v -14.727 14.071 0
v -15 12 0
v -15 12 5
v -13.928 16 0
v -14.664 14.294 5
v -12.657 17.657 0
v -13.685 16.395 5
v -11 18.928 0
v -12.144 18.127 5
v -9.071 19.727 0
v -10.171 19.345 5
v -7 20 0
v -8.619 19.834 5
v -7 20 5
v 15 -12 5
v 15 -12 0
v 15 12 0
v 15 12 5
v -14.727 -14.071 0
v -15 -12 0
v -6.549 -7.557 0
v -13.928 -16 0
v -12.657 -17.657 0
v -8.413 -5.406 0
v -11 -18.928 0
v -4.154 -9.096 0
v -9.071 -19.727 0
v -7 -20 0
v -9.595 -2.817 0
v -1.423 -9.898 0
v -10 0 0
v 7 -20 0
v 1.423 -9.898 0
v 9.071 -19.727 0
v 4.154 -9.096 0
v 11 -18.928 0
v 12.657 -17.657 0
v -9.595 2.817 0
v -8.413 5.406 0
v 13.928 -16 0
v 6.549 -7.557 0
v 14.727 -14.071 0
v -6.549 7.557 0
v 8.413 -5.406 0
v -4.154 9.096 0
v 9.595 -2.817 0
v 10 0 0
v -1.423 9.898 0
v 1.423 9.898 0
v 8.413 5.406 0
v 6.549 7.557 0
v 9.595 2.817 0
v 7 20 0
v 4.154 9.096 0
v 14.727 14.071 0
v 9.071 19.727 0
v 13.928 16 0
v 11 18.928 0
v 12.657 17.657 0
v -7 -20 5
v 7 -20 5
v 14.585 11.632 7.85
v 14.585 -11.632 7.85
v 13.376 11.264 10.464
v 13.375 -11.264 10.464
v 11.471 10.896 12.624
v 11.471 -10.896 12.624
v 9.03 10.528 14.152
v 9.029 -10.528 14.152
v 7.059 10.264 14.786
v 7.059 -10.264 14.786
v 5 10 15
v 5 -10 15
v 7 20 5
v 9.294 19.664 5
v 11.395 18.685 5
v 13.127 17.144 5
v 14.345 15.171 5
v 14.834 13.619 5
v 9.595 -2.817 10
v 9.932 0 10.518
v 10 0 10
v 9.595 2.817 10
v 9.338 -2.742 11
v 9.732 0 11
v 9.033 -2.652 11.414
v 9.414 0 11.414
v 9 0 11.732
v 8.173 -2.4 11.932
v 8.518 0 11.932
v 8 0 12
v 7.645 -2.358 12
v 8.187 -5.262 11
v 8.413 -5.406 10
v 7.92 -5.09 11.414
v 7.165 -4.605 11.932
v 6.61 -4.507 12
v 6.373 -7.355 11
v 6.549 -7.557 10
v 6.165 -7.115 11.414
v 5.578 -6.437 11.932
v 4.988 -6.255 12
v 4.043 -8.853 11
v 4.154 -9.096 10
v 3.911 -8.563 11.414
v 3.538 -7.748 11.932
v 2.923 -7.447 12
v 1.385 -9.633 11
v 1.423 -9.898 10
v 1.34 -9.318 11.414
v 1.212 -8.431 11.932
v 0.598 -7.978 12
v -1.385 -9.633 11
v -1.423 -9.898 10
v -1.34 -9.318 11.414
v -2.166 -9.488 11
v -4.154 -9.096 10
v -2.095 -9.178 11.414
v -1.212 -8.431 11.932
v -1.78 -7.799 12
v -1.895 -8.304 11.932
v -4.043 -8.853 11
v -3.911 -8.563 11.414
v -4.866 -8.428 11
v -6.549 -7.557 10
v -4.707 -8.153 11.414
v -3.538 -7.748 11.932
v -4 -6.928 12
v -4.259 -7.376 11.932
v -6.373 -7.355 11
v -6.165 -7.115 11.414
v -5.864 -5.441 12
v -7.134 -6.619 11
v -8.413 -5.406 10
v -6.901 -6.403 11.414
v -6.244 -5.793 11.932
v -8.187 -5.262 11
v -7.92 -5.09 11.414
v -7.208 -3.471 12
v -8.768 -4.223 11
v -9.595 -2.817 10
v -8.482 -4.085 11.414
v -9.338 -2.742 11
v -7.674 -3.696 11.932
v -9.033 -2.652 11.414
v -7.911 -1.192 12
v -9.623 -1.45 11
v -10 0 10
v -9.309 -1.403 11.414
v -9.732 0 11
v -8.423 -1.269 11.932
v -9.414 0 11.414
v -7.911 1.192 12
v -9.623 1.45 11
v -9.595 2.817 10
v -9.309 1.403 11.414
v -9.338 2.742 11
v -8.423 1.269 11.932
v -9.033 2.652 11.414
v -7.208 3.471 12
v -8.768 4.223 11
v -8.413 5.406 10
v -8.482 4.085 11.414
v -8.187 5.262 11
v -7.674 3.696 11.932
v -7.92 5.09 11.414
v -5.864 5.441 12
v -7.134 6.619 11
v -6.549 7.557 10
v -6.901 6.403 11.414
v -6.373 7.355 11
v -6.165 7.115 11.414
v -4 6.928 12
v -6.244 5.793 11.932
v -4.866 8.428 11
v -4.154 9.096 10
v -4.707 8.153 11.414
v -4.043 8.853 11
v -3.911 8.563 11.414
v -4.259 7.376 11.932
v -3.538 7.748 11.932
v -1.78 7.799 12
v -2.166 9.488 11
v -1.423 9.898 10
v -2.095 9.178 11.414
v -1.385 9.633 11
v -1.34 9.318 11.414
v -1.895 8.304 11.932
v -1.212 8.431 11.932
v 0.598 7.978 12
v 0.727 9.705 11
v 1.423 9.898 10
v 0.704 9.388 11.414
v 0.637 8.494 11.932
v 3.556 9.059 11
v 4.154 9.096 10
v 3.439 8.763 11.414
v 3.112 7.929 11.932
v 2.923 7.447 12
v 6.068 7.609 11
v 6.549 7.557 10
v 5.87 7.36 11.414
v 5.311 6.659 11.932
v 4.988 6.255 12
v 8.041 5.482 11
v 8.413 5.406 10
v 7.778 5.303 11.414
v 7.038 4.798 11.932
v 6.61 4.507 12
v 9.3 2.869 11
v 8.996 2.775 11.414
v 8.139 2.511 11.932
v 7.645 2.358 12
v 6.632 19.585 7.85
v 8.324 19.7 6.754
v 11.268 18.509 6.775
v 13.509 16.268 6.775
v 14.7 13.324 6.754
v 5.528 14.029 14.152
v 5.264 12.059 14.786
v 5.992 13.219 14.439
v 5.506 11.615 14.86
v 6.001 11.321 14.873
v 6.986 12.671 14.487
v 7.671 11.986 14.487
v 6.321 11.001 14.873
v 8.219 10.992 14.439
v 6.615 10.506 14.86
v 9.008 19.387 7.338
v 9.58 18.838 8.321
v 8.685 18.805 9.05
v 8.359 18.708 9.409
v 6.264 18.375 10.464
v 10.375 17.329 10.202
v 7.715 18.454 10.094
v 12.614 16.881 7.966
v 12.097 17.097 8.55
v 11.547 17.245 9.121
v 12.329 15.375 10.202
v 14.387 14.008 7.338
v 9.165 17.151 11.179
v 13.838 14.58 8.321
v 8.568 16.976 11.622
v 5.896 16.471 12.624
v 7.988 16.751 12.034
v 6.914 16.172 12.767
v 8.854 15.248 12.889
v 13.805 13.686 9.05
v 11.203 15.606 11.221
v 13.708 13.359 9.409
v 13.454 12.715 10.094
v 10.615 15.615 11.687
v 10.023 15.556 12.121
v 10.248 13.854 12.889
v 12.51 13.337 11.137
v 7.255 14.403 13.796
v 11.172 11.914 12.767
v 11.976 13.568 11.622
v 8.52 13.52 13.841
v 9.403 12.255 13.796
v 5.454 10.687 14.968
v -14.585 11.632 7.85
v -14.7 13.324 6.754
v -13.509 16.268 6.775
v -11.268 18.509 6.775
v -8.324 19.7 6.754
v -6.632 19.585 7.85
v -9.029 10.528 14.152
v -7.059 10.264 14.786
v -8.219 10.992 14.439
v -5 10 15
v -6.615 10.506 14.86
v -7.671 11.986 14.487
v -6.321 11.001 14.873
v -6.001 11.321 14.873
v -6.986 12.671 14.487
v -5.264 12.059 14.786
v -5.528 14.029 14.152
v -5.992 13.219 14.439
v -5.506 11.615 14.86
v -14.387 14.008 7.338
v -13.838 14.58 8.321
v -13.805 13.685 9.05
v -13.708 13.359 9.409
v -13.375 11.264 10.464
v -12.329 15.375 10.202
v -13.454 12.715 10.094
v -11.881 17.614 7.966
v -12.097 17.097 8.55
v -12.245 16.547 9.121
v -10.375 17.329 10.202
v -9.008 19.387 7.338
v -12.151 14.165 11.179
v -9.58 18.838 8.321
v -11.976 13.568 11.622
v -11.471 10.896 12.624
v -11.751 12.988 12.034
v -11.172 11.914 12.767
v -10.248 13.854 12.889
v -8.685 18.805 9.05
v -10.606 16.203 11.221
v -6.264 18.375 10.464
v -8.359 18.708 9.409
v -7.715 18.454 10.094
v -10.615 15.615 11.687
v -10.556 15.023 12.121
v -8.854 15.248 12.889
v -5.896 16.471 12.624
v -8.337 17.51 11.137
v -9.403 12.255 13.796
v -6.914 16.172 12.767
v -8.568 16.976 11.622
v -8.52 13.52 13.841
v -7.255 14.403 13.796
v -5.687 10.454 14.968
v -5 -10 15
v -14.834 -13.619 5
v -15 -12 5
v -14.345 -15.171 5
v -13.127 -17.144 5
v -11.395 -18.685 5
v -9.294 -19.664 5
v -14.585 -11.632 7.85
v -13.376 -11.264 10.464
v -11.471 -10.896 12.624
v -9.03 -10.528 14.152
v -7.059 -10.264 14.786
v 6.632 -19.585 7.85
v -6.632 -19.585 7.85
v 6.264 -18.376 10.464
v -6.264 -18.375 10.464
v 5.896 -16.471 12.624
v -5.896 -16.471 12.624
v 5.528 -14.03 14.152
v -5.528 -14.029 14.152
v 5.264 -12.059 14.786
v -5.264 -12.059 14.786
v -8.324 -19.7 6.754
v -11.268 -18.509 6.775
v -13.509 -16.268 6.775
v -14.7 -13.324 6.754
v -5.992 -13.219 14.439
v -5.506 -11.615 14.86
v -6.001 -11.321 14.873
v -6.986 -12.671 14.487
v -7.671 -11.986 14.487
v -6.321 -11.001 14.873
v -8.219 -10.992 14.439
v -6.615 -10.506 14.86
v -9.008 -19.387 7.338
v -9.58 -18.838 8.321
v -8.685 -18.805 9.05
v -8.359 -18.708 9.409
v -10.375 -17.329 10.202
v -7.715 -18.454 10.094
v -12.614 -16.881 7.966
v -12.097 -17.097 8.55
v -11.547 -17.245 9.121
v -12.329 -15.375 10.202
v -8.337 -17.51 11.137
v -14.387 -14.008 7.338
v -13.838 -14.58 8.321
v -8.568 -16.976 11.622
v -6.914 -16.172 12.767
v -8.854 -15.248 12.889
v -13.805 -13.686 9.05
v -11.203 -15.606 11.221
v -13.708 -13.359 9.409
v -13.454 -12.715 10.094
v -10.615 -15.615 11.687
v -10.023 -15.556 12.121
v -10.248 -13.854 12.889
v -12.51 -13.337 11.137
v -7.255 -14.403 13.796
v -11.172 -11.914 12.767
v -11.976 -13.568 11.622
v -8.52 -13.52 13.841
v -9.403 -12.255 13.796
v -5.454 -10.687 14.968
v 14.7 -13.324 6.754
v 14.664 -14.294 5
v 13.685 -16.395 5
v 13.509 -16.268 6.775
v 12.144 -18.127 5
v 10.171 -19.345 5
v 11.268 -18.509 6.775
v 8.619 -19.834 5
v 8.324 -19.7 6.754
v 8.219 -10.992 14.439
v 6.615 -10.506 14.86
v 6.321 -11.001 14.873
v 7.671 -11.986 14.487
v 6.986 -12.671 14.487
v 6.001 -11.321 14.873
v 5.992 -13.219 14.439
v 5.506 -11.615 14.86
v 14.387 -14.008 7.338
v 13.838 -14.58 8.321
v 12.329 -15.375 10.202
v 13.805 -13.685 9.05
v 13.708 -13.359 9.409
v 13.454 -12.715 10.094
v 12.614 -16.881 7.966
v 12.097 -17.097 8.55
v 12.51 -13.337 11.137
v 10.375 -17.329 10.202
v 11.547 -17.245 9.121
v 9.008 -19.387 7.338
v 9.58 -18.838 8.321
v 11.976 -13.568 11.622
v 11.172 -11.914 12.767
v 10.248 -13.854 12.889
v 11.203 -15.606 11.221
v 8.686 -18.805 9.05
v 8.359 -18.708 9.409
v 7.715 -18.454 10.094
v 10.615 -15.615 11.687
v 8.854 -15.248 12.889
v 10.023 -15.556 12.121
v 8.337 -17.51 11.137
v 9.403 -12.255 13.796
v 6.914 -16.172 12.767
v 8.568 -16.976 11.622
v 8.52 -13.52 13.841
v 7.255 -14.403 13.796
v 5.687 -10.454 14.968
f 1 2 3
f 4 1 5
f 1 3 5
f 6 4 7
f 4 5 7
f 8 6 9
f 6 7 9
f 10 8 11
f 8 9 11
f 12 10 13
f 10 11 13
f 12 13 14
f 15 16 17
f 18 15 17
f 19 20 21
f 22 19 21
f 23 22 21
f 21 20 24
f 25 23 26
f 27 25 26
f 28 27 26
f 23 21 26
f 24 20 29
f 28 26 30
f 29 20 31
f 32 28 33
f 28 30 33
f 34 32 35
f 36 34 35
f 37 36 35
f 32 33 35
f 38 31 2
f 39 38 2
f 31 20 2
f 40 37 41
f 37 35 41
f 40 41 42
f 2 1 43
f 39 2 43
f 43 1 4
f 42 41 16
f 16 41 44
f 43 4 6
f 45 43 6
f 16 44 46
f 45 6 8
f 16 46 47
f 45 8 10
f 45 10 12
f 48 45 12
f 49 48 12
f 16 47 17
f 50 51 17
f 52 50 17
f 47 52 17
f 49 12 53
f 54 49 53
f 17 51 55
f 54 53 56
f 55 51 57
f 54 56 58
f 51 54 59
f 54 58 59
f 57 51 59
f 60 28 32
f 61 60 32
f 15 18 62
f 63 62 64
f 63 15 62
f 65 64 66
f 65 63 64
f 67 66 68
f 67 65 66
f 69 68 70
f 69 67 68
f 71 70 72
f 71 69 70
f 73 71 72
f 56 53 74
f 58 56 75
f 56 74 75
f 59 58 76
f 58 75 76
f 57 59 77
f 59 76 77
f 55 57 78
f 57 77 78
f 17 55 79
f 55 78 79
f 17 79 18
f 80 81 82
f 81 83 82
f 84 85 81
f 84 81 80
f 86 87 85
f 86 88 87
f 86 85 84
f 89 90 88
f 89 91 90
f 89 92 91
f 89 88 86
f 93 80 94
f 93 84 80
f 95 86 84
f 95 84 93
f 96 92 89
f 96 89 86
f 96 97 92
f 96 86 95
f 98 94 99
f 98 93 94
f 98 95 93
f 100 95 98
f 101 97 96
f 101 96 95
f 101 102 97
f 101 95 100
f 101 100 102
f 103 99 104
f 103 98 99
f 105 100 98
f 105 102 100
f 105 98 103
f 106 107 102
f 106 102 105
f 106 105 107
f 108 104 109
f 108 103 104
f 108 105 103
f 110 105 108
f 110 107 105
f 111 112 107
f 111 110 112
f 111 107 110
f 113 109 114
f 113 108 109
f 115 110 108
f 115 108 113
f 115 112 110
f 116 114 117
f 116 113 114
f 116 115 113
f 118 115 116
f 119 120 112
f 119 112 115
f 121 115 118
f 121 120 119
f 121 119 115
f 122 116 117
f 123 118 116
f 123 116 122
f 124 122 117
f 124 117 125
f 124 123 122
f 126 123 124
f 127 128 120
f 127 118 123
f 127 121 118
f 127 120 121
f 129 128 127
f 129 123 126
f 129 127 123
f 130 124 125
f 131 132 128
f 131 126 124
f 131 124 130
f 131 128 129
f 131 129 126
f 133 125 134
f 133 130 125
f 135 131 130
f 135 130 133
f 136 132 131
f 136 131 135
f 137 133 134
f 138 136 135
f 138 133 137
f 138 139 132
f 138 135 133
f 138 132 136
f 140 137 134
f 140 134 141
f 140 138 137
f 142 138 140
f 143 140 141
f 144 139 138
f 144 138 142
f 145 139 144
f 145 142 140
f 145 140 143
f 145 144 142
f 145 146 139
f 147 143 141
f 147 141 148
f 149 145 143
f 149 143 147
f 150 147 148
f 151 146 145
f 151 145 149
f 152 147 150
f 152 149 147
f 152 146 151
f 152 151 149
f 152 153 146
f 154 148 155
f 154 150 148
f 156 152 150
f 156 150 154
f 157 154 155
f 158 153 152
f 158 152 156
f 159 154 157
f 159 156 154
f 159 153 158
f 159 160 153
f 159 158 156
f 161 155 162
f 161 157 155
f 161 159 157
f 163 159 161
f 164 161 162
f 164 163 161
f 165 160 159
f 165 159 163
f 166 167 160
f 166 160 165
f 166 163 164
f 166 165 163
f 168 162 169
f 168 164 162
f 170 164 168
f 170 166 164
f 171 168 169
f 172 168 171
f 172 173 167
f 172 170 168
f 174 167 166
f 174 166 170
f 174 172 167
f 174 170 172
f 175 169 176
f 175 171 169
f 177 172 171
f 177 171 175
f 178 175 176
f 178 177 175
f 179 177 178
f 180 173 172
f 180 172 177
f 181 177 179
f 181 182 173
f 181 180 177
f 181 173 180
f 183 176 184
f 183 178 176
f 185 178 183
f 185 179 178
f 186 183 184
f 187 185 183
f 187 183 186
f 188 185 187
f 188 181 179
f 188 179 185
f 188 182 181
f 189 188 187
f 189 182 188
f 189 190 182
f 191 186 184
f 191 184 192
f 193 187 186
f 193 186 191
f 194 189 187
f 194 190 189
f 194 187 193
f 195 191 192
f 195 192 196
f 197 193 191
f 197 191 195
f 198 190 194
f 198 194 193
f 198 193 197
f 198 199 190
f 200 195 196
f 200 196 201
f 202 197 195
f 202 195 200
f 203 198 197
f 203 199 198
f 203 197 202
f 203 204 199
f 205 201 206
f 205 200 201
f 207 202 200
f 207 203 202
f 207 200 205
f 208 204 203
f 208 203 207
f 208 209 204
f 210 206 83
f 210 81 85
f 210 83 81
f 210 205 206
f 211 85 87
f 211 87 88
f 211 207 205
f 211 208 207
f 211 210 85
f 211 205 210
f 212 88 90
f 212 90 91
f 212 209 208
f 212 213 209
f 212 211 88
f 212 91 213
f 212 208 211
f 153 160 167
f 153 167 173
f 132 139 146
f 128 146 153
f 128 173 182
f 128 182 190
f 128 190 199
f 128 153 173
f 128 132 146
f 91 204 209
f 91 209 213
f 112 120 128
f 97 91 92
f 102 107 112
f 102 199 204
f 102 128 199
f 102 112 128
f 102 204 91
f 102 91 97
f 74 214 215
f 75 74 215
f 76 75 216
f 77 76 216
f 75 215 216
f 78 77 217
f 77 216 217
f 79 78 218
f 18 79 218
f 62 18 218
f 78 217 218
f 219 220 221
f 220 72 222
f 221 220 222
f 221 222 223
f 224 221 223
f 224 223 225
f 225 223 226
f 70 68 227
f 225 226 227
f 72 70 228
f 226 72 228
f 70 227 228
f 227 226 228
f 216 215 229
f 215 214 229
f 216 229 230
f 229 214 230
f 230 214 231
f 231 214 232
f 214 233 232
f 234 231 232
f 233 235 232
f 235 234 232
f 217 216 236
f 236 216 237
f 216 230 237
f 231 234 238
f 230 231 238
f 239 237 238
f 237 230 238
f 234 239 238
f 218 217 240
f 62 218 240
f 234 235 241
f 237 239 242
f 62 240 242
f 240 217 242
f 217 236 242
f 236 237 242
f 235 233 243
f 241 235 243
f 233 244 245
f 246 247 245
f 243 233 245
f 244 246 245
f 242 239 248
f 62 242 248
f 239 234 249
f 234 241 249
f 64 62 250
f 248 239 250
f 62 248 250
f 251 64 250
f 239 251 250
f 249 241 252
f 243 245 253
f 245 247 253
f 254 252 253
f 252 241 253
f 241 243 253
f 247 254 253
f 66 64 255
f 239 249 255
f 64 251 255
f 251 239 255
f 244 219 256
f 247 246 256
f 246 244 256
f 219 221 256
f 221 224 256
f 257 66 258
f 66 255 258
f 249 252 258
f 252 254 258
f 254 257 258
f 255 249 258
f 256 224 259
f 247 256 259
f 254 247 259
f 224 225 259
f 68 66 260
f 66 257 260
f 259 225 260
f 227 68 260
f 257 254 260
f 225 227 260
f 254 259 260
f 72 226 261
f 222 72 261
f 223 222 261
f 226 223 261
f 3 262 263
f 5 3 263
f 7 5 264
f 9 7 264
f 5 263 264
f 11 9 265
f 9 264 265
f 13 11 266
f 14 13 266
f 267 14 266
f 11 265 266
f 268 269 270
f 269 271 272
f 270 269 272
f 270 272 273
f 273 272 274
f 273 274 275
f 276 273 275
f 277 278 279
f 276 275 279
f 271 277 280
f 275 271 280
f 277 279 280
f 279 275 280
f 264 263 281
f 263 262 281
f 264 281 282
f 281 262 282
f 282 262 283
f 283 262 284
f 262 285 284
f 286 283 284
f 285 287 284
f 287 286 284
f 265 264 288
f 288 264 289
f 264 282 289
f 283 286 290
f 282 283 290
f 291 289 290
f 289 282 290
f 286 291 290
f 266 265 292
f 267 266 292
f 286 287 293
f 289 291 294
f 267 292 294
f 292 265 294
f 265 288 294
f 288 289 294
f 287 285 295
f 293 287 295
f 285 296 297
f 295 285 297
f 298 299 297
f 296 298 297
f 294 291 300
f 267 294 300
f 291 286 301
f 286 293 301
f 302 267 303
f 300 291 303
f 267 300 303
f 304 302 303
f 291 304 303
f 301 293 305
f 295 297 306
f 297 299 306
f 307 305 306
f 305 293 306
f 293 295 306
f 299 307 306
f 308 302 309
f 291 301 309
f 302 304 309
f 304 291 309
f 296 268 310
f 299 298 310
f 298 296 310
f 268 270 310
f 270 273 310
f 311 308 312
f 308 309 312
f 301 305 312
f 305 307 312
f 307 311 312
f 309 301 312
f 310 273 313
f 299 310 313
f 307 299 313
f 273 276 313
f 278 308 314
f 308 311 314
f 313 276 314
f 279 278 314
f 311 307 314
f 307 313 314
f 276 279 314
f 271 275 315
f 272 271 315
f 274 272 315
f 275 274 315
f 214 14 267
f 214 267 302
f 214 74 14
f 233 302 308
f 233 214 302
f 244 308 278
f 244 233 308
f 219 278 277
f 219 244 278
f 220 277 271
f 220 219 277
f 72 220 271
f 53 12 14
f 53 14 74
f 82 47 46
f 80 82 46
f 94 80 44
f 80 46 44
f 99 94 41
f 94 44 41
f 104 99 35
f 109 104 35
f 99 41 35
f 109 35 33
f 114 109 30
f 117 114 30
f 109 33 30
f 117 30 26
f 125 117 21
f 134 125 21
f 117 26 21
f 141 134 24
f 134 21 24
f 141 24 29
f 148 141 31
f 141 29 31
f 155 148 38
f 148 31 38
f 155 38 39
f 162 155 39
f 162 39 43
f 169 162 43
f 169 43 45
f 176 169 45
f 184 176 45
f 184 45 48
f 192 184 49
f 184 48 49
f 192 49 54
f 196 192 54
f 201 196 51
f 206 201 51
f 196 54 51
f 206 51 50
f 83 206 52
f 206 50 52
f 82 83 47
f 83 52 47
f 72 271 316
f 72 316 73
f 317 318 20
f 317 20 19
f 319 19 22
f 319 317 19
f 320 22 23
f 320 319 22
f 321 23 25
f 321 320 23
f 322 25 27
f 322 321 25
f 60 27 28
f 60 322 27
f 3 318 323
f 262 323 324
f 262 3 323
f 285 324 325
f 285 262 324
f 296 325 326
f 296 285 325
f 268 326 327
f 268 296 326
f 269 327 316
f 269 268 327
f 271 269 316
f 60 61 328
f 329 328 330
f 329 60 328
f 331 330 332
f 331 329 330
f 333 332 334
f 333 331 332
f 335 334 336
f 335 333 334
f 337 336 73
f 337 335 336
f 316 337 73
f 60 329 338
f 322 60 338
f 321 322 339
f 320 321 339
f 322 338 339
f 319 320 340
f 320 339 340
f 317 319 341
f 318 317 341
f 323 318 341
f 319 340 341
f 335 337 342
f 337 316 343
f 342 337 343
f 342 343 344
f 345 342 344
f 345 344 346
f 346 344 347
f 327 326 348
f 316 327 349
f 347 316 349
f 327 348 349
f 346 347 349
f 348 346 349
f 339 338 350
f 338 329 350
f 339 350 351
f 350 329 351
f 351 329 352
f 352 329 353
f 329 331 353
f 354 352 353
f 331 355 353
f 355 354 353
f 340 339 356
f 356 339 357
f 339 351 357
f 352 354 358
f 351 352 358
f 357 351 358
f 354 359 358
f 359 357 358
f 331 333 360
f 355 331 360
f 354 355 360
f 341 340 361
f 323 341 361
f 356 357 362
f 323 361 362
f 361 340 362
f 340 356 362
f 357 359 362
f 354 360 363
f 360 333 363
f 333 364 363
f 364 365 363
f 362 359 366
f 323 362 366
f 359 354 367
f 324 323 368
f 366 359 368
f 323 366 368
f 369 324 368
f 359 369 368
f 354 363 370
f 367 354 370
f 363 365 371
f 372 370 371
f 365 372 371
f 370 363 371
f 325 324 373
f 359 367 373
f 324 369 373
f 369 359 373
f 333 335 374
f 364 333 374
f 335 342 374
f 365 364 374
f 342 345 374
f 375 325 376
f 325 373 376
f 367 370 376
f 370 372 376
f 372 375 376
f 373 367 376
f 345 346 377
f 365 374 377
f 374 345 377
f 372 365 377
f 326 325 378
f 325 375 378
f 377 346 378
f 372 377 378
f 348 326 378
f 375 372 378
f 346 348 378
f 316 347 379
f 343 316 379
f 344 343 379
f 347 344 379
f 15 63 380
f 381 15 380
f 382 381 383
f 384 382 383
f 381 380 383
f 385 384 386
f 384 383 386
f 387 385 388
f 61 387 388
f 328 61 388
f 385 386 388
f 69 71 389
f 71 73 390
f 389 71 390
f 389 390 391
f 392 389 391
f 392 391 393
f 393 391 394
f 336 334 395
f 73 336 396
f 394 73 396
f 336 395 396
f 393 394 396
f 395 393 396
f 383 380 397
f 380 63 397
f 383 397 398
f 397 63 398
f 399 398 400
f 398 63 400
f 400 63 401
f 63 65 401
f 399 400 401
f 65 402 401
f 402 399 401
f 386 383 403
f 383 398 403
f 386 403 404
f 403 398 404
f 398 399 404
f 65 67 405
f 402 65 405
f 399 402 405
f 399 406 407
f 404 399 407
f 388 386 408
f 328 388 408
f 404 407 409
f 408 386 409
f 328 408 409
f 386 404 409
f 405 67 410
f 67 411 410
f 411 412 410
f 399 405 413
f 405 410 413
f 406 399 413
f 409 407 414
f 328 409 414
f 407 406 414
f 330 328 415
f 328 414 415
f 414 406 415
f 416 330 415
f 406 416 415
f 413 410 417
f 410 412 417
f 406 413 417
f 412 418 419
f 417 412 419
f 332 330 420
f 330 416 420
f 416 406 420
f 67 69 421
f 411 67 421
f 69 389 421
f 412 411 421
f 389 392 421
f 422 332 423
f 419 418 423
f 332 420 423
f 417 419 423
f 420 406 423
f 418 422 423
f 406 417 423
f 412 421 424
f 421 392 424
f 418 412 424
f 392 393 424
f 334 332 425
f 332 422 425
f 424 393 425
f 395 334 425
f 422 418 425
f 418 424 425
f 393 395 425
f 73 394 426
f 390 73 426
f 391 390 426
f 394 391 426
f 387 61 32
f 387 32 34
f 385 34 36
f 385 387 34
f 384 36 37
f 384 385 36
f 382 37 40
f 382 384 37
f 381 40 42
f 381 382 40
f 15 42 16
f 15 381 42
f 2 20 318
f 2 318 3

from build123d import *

# Parameters (mm, degrees)
SKETCH_W     = 30
SKETCH_H     = 40
PAD_DEPTH    = 15
SKETCH001_R  = 10
POCKET_DEPTH = 12
FILLET_R     = 2
FILLET001_R  = 8
FILLET002_R  = 10


with BuildPart() as part:
    # Sketch → Pad (new body)
    with BuildSketch(Plane.XY):
        Rectangle(SKETCH_W, SKETCH_H)
    extrude(amount=PAD_DEPTH)

    # Sketch001 (on Face5 of Pad) → Pocket (cut)
    with BuildSketch(Plane(origin=(0, 0, 0), x_dir=(1, 0, 0), z_dir=(0, 0, -1))):
        Circle(SKETCH001_R)
    extrude(amount=-POCKET_DEPTH, mode=Mode.SUBTRACT)

    # Fillet
    fillet_edges = [part.edges().sort_by_distance(p)[0] for p in [
        (-10, 0, 12),
    ]]
    fillet(fillet_edges, radius=FILLET_R)

    # Fillet001
    fillet001_edges = [part.edges().sort_by_distance(p)[0] for p in [
        (-15, 20, 7.5),
        (-15, -20, 7.5),
        (15, -20, 7.5),
        (15, 20, 7.5),
    ]]
    fillet(fillet001_edges, radius=FILLET001_R)

    # Fillet002
    fillet002_edges = [part.edges().sort_by_distance(p)[0] for p in [
        (0, 20, 15),
        (12.656854, 17.656854, 15),
        (-12.656854, 17.656854, 15),
        (15, 0, 15),
        (-15, 0, 15),
        (12.656854, -17.656854, 15),
        (-12.656854, -17.656854, 15),
        (0, -20, 15),
    ]]
    fillet(fillet002_edges, radius=FILLET002_R)


solid = part.part
